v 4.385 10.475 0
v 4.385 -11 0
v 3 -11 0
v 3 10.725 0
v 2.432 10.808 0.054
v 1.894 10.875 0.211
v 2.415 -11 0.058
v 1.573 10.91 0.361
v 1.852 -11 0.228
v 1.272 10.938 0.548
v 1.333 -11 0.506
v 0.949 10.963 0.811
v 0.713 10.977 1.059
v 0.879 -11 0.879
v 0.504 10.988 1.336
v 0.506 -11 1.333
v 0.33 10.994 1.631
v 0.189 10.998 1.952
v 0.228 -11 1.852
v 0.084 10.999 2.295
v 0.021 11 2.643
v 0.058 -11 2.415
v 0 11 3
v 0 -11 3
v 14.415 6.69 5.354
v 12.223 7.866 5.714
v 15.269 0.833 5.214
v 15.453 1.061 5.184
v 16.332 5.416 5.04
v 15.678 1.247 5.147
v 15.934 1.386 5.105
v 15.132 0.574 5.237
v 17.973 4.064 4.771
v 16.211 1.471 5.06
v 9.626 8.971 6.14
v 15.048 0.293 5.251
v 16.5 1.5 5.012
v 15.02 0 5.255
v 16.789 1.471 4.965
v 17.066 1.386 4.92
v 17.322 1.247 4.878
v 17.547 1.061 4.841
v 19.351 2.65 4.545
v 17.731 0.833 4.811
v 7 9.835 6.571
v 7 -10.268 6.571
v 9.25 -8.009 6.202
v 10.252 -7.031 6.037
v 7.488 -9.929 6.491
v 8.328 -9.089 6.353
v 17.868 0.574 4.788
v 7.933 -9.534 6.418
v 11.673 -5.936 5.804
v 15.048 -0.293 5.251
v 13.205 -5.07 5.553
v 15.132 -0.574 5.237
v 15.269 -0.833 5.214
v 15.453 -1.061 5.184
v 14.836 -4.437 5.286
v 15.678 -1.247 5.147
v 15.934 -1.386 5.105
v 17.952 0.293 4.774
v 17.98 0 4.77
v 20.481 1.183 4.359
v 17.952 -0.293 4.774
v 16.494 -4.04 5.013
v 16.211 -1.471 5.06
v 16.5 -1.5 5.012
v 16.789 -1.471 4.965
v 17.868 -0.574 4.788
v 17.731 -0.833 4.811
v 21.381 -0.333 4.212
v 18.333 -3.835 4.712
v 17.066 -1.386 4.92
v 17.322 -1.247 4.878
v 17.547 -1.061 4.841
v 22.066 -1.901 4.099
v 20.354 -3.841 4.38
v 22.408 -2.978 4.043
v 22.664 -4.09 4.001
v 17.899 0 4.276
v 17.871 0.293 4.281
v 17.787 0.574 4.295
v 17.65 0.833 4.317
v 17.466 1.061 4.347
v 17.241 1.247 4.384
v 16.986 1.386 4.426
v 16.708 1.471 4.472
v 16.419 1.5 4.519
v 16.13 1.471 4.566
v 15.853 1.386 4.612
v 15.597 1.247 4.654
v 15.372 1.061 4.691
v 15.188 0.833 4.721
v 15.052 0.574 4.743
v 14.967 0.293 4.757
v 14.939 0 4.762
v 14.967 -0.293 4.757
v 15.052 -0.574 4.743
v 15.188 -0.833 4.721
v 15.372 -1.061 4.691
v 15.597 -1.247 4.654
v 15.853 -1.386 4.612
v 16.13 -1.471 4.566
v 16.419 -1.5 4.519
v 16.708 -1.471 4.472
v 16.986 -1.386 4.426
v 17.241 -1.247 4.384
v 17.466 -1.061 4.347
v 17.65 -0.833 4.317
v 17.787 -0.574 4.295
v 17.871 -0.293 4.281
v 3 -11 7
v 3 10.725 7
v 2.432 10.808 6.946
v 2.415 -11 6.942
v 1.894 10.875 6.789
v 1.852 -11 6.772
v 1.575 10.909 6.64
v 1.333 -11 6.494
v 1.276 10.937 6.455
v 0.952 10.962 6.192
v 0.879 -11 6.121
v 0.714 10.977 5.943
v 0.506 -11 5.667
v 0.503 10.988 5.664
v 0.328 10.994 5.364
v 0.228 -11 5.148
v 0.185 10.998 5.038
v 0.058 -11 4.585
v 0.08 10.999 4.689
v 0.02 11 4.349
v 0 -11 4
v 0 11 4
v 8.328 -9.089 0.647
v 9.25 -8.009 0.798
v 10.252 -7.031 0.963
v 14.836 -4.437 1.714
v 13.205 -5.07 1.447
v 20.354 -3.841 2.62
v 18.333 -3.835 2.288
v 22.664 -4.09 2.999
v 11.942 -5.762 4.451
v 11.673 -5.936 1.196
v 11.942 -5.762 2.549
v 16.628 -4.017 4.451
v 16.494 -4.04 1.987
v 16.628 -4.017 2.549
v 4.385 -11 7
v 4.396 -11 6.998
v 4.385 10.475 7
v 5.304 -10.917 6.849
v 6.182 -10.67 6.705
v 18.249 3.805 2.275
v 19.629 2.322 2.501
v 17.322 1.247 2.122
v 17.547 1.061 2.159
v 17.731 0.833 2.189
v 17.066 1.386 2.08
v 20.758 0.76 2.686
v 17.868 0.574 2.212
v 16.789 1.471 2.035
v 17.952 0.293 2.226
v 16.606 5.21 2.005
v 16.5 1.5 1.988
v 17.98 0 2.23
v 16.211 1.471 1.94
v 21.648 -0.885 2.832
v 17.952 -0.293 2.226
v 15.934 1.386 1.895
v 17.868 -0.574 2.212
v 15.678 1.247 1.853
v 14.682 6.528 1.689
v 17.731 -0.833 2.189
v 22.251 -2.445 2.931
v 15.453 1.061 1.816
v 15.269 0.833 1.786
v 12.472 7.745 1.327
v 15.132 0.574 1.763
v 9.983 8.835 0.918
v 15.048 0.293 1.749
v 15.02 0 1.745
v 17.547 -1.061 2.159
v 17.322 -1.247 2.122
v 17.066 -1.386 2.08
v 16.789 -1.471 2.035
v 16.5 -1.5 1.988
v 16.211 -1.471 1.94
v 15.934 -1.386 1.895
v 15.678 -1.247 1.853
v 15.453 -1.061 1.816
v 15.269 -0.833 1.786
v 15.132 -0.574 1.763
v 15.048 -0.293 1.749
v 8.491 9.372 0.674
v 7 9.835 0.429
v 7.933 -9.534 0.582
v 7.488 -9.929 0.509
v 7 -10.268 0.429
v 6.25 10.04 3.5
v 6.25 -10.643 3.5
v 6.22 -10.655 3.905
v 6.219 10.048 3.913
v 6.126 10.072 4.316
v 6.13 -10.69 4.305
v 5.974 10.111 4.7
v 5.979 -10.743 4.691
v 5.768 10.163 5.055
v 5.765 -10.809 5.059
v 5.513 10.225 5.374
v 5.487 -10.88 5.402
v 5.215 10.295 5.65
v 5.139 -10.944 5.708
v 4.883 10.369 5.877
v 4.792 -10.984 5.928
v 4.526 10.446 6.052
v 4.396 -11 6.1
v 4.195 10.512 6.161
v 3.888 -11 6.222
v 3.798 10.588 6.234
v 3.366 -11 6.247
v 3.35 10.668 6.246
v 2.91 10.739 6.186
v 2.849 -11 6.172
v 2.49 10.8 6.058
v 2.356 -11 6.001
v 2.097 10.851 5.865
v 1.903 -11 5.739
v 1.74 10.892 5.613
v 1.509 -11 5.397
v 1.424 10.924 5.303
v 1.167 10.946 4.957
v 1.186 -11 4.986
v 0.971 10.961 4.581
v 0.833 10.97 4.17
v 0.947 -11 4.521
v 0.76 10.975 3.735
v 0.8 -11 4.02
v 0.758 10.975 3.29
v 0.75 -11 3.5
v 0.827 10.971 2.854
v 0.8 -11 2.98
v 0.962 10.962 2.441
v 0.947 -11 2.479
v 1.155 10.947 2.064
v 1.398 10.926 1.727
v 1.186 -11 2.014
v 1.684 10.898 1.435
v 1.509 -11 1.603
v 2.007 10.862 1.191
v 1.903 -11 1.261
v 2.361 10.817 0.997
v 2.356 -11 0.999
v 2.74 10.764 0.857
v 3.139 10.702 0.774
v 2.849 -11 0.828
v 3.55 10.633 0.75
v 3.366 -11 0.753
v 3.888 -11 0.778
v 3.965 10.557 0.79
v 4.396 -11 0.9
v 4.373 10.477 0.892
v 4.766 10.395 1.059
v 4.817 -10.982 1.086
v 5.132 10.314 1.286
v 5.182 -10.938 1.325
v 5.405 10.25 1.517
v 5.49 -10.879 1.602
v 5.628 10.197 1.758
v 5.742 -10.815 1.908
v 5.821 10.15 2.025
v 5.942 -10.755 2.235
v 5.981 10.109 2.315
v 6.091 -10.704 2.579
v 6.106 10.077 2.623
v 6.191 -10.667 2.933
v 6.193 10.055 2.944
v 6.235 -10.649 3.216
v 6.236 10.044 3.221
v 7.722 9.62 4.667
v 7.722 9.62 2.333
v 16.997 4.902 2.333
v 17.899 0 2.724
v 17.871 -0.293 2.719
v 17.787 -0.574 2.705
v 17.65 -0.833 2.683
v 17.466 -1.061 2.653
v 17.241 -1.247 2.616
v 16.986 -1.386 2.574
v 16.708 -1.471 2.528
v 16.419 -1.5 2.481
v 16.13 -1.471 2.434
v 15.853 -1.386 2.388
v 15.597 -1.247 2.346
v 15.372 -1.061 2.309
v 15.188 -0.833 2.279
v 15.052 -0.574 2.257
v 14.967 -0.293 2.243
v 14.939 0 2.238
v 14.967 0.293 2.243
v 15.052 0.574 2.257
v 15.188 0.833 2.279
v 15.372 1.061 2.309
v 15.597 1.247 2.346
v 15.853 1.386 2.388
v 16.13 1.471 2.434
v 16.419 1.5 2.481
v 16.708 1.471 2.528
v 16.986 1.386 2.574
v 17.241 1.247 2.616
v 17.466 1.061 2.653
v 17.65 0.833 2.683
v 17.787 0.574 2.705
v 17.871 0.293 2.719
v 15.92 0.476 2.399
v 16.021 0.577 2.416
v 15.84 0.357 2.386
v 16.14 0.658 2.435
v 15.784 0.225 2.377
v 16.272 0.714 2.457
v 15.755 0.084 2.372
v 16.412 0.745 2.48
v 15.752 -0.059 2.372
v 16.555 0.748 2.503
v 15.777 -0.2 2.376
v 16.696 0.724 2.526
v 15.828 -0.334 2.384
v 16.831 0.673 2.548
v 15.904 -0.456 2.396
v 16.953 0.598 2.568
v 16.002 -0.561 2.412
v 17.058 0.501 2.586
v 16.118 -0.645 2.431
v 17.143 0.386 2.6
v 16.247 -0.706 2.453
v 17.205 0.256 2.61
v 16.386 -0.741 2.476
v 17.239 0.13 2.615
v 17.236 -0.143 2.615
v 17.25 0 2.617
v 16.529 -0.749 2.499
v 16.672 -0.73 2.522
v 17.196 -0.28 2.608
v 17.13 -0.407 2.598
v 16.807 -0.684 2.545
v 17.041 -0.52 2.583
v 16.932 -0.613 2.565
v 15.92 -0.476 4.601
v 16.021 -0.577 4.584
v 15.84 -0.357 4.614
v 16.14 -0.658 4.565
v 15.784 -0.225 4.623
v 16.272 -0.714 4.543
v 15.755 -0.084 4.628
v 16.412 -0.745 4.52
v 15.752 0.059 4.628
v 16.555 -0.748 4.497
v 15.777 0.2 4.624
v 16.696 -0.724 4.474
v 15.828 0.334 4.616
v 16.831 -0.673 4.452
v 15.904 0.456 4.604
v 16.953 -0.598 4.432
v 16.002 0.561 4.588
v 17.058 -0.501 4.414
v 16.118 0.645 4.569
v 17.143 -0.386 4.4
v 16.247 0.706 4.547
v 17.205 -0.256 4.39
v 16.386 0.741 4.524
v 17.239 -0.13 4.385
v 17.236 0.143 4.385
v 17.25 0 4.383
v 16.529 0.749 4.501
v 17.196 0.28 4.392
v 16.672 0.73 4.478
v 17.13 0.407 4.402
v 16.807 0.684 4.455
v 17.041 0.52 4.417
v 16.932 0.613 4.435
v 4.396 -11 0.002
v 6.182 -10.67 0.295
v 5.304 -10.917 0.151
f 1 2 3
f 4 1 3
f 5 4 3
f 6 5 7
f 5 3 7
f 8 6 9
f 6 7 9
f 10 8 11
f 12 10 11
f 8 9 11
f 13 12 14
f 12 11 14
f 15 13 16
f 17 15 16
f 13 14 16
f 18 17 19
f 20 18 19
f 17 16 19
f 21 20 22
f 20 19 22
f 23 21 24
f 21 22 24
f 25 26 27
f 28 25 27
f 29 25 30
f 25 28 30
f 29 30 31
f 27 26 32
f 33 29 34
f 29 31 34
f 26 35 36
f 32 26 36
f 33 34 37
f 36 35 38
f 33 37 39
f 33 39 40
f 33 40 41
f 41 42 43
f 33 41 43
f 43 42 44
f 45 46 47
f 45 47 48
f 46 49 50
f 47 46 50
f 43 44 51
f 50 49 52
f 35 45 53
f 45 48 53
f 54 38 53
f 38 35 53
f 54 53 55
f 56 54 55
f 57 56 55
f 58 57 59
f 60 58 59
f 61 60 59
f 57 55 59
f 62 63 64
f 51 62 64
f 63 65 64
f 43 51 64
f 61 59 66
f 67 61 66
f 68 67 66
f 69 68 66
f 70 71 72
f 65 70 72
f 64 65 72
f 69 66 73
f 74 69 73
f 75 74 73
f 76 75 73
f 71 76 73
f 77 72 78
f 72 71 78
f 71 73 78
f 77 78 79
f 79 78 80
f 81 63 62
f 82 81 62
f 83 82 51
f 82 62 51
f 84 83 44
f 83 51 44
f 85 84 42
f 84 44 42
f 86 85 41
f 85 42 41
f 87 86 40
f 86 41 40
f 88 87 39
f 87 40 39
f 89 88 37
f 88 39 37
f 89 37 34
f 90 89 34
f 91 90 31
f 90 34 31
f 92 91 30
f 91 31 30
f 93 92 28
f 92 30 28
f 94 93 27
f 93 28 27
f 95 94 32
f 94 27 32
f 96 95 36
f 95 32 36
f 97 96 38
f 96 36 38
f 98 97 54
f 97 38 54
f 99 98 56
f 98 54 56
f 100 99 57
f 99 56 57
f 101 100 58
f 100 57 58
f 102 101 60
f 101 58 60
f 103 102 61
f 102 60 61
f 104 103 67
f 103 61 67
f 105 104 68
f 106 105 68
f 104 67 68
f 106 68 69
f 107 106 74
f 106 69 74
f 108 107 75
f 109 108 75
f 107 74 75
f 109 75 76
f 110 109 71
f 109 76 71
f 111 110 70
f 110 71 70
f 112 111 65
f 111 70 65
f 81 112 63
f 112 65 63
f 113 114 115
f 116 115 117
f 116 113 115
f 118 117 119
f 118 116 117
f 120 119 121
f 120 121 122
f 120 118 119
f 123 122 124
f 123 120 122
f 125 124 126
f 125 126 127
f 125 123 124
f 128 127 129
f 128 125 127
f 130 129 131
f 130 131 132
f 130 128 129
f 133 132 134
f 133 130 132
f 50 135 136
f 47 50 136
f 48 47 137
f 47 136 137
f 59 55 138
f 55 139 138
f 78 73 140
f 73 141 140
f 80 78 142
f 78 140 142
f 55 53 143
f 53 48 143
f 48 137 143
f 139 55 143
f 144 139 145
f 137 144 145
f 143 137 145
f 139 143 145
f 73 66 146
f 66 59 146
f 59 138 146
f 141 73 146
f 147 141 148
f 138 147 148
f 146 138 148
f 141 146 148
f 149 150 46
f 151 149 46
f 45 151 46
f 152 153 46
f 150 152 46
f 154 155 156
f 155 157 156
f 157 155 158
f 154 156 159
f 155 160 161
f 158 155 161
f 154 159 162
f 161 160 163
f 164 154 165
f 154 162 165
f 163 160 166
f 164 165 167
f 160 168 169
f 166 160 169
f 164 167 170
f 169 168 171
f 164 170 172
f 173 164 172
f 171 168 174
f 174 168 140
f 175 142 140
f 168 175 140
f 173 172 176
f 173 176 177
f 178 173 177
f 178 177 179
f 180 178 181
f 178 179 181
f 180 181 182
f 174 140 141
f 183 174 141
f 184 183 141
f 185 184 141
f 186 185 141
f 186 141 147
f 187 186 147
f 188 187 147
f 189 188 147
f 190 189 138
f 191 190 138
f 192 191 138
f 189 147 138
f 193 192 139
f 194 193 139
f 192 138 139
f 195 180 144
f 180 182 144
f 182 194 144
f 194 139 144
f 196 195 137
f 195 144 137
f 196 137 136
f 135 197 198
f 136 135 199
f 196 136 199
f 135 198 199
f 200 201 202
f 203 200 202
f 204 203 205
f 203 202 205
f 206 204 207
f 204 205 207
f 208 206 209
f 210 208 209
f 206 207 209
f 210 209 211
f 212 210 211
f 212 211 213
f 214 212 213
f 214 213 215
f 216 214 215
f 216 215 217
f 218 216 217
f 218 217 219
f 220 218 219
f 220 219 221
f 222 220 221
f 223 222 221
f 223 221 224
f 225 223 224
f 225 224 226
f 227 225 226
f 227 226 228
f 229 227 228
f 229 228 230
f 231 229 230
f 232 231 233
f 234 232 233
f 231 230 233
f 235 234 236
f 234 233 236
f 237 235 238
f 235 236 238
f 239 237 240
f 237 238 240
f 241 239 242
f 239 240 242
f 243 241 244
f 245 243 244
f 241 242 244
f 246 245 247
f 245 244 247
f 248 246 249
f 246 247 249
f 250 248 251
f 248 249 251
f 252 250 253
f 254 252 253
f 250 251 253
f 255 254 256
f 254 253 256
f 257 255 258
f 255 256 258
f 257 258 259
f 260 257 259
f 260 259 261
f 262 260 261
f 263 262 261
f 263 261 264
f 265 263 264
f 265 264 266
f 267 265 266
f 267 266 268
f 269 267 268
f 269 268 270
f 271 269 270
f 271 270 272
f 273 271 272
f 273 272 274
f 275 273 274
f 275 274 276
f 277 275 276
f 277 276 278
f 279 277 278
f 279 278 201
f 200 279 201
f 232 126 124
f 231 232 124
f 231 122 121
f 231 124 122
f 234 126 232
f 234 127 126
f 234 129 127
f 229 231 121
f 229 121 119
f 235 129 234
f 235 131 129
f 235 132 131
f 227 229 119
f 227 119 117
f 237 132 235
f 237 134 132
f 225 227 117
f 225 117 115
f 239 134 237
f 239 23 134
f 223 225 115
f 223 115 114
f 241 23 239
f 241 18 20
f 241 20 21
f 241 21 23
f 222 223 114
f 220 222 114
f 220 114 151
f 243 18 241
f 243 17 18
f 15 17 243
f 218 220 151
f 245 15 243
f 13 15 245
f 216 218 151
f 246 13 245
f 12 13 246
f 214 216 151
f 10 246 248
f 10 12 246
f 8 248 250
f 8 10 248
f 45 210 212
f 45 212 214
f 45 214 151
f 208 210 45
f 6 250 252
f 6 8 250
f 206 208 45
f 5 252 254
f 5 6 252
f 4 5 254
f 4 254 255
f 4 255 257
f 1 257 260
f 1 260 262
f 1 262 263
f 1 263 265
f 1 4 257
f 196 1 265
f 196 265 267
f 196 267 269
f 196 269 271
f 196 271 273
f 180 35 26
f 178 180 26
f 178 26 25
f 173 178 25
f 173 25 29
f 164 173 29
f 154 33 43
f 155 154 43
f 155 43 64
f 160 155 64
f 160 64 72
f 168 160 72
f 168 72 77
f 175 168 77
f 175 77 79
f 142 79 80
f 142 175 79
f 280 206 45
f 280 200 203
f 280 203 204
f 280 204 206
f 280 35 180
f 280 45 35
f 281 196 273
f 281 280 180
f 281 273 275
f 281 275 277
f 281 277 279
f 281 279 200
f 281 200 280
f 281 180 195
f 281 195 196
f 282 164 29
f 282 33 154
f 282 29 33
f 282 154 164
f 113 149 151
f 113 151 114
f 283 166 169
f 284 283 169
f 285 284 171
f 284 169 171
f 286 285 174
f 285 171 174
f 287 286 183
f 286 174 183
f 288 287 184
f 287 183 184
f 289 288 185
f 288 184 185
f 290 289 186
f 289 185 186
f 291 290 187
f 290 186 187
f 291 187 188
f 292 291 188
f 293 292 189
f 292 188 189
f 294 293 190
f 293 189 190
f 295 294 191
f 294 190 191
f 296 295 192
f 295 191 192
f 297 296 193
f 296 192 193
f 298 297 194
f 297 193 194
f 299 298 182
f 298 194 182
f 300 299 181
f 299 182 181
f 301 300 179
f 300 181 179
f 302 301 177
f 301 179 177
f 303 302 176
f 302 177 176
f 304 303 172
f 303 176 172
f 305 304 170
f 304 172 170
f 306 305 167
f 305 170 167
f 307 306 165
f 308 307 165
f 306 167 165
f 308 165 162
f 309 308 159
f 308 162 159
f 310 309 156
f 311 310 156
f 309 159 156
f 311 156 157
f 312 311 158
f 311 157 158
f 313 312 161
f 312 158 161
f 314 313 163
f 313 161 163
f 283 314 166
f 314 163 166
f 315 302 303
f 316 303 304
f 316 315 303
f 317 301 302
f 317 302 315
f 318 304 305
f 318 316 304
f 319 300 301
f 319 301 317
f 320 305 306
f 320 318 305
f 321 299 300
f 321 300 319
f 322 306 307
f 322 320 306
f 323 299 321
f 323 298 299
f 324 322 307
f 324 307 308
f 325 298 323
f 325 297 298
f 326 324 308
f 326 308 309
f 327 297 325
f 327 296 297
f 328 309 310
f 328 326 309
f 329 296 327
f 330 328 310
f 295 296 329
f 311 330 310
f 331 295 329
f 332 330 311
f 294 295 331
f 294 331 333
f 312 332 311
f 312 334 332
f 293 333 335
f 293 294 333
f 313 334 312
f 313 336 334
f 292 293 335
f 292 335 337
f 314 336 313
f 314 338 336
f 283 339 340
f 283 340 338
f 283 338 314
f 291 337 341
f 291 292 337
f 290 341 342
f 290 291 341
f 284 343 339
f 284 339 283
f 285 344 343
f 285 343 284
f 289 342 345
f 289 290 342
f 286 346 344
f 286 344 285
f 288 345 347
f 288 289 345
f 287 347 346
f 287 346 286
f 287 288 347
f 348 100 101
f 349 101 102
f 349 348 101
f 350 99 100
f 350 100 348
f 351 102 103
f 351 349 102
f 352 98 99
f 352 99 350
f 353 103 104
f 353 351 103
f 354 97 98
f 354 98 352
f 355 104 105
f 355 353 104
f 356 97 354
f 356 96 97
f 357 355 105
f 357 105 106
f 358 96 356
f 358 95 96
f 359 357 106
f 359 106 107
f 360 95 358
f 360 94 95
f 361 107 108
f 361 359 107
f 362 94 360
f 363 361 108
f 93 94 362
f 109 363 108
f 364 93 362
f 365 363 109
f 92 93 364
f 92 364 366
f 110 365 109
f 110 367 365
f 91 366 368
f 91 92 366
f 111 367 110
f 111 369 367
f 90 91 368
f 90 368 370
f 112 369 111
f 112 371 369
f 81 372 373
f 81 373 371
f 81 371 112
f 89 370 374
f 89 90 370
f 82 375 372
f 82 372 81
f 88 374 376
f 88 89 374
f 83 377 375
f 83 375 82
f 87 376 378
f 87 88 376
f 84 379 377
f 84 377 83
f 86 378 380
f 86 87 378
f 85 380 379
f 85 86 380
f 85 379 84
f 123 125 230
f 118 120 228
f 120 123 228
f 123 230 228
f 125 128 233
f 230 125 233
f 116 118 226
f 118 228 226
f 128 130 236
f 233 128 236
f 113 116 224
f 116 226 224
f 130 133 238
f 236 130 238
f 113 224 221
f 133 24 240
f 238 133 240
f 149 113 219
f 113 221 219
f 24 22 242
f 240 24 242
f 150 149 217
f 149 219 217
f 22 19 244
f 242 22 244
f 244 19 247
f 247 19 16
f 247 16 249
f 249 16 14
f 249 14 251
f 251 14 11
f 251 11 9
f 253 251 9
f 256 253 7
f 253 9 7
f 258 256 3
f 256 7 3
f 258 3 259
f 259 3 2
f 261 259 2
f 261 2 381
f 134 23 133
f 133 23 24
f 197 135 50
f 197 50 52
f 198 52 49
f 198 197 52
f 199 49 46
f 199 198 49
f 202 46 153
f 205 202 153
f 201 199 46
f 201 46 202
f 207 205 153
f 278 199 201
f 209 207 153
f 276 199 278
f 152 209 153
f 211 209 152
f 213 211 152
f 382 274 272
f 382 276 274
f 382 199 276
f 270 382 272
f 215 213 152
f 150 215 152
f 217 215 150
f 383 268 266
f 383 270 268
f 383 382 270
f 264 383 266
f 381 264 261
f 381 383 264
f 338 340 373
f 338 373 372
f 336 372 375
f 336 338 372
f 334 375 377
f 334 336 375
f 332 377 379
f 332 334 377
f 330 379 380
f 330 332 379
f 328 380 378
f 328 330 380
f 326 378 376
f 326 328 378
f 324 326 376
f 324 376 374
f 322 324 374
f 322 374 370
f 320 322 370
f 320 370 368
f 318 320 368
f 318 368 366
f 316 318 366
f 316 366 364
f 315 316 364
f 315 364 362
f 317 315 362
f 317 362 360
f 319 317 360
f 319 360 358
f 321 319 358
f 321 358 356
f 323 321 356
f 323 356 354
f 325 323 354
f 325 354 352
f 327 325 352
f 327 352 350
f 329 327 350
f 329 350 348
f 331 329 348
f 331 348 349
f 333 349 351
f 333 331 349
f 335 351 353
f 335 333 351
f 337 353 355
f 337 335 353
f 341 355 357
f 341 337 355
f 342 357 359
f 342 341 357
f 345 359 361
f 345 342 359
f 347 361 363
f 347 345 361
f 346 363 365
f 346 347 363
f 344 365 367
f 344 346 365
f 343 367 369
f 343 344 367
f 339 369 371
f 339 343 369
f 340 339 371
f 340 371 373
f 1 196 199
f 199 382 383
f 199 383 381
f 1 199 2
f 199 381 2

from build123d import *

# Parameters (mm, degrees)
F0_R         = 0.75
F1_DEPTH     = 7
F2_R         = 2.75
F3_DEPTH     = 25
F4_R         = 3
F6_DEPTH     = 25
F7_R         = 1.5
F8_DEPTH     = 0.5
F9_R         = 1.5
F10_DEPTH    = 0.5
F11_T4_DEPTH = 19.1627380087


# Not quite as in the source:
# - a fillet or chamfer that OpenCascade refuses, or shapes differently, is made with other operations: its cross-section is extruded or revolved along the edge and cut away or added


with BuildPart() as f1:
    # F0 (on Top) → F1 (new body)
    with BuildSketch(Plane.XY):
        with BuildLine():
            add(Edge.make_bspline(
                [(0, 11), (5.2254716866, 10.975911282), (20.5224081874, 7.3522534221), (22.6636249572, -4.0898798034)],
                knots=[0, 0, 0, 0, 27.2276397927, 27.2276397927, 27.2276397927, 27.2276397927], degree=3))
            Line((0, 11), (0, -11))
            Line((0, -11), (7, -11))
            add(Edge.make_bspline(
                [(7, -11), (10.2693928853, -5.7117650285), (14.8583007976, -2.8734656516), (22.6636249572, -4.0898798034)],
                knots=[0, 0, 0, 0, 17.1201316564, 17.1201316564, 17.1201316564, 17.1201316564], degree=3))
        make_face()
        with Locations((16.5, 0)):
            Circle(F0_R, mode=Mode.SUBTRACT)
    extrude(amount=F1_DEPTH)

    # F2 (on face) → F3 (cut)
    with BuildSketch(Plane.XZ.offset(11)):
        with Locations((3.5, 3.5)):
            Circle(F2_R)
    extrude(amount=-F3_DEPTH, mode=Mode.SUBTRACT)

    # F4
    f4_edges = [f1.edges().sort_by_distance(p)[0] for p in [
        (0, 0, 0),
        (0, 0, 7),
    ]]
    fillet(f4_edges, radius=F4_R)

    # F5 (on face) → F6 (cut)
    with BuildSketch(Plane.XZ.offset(11)):
        Polygon((7, 6.5709358384), (22.6717181504, 4), (26.1740684509, 7.8573133796), (11.5607753396, 11.3733848557), (4.3845428154, 7), (7, 7), align=None)
        Polygon((26.1740684509, -0.8573133796), (22.6717181504, 3), (7, 0.4290641616), (7, 0), (4.3845428154, 0), (11.5607753396, -4.3733848557), align=None)
        Polygon((4.3845428154, 7), (7, 6.5709358384), (7, 7), align=None)
        Polygon((7, 0), (7, 0.4290641616), (4.3845428154, 0), align=None)
    extrude(amount=-F6_DEPTH, mode=Mode.SUBTRACT)

    # F7 (on face) → F8 (cut)
    with BuildSketch(Plane(origin=(1.2331564946, 0, 7.5169830107), x_dir=(0.9868095474, 0, -0.1618855065), z_dir=(0.1618855065, 0, 0.9868095474))):
        with Locations((15.4709118351, 0)):
            Circle(F7_R)
    extrude(amount=-F8_DEPTH, mode=Mode.SUBTRACT)

    # F9 (on face) → F10 (cut)
    with BuildSketch(Plane(origin=(0.1149053506, 0, -0.7004314313), x_dir=(0.9868095474, 0, 0.1618855065), z_dir=(0.1618855065, 0, -0.9868095474))):
        with Locations((16.6041103809, 0)):
            Circle(F9_R)
    extrude(amount=-F10_DEPTH, mode=Mode.SUBTRACT)

    # F11: fillet of radius 5 on 1 edges, made by hand


with BuildPart() as f11_tool2:
    # F11_s3 → F11_t4 (new body)
    with BuildSketch(Plane.XY.offset(-6.0813690043)):
        with BuildLine():
            ThreePointArc((8.3278164384, -9.0886011335), (6.5818041274, -10.4968325334), (4.3958267336, -11))
            Line((4.3958267336, -11), (4.3958267336, -11.1))
            Line((4.3958267336, -11.1), (7, -11.1))
            Line((7, -11.1), (7.0850572831, -11.0525857262))
            ThreePointArc((7.0850572831, -11.0525857262), (7.7193199568, -10.0826857854), (8.4064562325, -9.1503731561))
            Line((8.4064562325, -9.1503731561), (8.3278164384, -9.0886011335))
        make_face()
    extrude(amount=F11_T4_DEPTH)

    split(bisect_by=Plane(origin=(0.1149053506, 0, -0.7004314313), x_dir=(0, 1, 0), z_dir=(-0.1618855065, 0, 0.9868095474)), keep=Keep.TOP)

    split(bisect_by=Plane(origin=(1.2331564946, 0, 7.5169830107), x_dir=(0, 1, 0), z_dir=(-0.1618855065, 0, -0.9868095474)), keep=Keep.TOP)


with BuildPart() as f1_1:
    add(f1.part)

    # F11_t1: cut F11_tool2
    add(f11_tool2.part, mode=Mode.SUBTRACT)


solid = f1_1.part
